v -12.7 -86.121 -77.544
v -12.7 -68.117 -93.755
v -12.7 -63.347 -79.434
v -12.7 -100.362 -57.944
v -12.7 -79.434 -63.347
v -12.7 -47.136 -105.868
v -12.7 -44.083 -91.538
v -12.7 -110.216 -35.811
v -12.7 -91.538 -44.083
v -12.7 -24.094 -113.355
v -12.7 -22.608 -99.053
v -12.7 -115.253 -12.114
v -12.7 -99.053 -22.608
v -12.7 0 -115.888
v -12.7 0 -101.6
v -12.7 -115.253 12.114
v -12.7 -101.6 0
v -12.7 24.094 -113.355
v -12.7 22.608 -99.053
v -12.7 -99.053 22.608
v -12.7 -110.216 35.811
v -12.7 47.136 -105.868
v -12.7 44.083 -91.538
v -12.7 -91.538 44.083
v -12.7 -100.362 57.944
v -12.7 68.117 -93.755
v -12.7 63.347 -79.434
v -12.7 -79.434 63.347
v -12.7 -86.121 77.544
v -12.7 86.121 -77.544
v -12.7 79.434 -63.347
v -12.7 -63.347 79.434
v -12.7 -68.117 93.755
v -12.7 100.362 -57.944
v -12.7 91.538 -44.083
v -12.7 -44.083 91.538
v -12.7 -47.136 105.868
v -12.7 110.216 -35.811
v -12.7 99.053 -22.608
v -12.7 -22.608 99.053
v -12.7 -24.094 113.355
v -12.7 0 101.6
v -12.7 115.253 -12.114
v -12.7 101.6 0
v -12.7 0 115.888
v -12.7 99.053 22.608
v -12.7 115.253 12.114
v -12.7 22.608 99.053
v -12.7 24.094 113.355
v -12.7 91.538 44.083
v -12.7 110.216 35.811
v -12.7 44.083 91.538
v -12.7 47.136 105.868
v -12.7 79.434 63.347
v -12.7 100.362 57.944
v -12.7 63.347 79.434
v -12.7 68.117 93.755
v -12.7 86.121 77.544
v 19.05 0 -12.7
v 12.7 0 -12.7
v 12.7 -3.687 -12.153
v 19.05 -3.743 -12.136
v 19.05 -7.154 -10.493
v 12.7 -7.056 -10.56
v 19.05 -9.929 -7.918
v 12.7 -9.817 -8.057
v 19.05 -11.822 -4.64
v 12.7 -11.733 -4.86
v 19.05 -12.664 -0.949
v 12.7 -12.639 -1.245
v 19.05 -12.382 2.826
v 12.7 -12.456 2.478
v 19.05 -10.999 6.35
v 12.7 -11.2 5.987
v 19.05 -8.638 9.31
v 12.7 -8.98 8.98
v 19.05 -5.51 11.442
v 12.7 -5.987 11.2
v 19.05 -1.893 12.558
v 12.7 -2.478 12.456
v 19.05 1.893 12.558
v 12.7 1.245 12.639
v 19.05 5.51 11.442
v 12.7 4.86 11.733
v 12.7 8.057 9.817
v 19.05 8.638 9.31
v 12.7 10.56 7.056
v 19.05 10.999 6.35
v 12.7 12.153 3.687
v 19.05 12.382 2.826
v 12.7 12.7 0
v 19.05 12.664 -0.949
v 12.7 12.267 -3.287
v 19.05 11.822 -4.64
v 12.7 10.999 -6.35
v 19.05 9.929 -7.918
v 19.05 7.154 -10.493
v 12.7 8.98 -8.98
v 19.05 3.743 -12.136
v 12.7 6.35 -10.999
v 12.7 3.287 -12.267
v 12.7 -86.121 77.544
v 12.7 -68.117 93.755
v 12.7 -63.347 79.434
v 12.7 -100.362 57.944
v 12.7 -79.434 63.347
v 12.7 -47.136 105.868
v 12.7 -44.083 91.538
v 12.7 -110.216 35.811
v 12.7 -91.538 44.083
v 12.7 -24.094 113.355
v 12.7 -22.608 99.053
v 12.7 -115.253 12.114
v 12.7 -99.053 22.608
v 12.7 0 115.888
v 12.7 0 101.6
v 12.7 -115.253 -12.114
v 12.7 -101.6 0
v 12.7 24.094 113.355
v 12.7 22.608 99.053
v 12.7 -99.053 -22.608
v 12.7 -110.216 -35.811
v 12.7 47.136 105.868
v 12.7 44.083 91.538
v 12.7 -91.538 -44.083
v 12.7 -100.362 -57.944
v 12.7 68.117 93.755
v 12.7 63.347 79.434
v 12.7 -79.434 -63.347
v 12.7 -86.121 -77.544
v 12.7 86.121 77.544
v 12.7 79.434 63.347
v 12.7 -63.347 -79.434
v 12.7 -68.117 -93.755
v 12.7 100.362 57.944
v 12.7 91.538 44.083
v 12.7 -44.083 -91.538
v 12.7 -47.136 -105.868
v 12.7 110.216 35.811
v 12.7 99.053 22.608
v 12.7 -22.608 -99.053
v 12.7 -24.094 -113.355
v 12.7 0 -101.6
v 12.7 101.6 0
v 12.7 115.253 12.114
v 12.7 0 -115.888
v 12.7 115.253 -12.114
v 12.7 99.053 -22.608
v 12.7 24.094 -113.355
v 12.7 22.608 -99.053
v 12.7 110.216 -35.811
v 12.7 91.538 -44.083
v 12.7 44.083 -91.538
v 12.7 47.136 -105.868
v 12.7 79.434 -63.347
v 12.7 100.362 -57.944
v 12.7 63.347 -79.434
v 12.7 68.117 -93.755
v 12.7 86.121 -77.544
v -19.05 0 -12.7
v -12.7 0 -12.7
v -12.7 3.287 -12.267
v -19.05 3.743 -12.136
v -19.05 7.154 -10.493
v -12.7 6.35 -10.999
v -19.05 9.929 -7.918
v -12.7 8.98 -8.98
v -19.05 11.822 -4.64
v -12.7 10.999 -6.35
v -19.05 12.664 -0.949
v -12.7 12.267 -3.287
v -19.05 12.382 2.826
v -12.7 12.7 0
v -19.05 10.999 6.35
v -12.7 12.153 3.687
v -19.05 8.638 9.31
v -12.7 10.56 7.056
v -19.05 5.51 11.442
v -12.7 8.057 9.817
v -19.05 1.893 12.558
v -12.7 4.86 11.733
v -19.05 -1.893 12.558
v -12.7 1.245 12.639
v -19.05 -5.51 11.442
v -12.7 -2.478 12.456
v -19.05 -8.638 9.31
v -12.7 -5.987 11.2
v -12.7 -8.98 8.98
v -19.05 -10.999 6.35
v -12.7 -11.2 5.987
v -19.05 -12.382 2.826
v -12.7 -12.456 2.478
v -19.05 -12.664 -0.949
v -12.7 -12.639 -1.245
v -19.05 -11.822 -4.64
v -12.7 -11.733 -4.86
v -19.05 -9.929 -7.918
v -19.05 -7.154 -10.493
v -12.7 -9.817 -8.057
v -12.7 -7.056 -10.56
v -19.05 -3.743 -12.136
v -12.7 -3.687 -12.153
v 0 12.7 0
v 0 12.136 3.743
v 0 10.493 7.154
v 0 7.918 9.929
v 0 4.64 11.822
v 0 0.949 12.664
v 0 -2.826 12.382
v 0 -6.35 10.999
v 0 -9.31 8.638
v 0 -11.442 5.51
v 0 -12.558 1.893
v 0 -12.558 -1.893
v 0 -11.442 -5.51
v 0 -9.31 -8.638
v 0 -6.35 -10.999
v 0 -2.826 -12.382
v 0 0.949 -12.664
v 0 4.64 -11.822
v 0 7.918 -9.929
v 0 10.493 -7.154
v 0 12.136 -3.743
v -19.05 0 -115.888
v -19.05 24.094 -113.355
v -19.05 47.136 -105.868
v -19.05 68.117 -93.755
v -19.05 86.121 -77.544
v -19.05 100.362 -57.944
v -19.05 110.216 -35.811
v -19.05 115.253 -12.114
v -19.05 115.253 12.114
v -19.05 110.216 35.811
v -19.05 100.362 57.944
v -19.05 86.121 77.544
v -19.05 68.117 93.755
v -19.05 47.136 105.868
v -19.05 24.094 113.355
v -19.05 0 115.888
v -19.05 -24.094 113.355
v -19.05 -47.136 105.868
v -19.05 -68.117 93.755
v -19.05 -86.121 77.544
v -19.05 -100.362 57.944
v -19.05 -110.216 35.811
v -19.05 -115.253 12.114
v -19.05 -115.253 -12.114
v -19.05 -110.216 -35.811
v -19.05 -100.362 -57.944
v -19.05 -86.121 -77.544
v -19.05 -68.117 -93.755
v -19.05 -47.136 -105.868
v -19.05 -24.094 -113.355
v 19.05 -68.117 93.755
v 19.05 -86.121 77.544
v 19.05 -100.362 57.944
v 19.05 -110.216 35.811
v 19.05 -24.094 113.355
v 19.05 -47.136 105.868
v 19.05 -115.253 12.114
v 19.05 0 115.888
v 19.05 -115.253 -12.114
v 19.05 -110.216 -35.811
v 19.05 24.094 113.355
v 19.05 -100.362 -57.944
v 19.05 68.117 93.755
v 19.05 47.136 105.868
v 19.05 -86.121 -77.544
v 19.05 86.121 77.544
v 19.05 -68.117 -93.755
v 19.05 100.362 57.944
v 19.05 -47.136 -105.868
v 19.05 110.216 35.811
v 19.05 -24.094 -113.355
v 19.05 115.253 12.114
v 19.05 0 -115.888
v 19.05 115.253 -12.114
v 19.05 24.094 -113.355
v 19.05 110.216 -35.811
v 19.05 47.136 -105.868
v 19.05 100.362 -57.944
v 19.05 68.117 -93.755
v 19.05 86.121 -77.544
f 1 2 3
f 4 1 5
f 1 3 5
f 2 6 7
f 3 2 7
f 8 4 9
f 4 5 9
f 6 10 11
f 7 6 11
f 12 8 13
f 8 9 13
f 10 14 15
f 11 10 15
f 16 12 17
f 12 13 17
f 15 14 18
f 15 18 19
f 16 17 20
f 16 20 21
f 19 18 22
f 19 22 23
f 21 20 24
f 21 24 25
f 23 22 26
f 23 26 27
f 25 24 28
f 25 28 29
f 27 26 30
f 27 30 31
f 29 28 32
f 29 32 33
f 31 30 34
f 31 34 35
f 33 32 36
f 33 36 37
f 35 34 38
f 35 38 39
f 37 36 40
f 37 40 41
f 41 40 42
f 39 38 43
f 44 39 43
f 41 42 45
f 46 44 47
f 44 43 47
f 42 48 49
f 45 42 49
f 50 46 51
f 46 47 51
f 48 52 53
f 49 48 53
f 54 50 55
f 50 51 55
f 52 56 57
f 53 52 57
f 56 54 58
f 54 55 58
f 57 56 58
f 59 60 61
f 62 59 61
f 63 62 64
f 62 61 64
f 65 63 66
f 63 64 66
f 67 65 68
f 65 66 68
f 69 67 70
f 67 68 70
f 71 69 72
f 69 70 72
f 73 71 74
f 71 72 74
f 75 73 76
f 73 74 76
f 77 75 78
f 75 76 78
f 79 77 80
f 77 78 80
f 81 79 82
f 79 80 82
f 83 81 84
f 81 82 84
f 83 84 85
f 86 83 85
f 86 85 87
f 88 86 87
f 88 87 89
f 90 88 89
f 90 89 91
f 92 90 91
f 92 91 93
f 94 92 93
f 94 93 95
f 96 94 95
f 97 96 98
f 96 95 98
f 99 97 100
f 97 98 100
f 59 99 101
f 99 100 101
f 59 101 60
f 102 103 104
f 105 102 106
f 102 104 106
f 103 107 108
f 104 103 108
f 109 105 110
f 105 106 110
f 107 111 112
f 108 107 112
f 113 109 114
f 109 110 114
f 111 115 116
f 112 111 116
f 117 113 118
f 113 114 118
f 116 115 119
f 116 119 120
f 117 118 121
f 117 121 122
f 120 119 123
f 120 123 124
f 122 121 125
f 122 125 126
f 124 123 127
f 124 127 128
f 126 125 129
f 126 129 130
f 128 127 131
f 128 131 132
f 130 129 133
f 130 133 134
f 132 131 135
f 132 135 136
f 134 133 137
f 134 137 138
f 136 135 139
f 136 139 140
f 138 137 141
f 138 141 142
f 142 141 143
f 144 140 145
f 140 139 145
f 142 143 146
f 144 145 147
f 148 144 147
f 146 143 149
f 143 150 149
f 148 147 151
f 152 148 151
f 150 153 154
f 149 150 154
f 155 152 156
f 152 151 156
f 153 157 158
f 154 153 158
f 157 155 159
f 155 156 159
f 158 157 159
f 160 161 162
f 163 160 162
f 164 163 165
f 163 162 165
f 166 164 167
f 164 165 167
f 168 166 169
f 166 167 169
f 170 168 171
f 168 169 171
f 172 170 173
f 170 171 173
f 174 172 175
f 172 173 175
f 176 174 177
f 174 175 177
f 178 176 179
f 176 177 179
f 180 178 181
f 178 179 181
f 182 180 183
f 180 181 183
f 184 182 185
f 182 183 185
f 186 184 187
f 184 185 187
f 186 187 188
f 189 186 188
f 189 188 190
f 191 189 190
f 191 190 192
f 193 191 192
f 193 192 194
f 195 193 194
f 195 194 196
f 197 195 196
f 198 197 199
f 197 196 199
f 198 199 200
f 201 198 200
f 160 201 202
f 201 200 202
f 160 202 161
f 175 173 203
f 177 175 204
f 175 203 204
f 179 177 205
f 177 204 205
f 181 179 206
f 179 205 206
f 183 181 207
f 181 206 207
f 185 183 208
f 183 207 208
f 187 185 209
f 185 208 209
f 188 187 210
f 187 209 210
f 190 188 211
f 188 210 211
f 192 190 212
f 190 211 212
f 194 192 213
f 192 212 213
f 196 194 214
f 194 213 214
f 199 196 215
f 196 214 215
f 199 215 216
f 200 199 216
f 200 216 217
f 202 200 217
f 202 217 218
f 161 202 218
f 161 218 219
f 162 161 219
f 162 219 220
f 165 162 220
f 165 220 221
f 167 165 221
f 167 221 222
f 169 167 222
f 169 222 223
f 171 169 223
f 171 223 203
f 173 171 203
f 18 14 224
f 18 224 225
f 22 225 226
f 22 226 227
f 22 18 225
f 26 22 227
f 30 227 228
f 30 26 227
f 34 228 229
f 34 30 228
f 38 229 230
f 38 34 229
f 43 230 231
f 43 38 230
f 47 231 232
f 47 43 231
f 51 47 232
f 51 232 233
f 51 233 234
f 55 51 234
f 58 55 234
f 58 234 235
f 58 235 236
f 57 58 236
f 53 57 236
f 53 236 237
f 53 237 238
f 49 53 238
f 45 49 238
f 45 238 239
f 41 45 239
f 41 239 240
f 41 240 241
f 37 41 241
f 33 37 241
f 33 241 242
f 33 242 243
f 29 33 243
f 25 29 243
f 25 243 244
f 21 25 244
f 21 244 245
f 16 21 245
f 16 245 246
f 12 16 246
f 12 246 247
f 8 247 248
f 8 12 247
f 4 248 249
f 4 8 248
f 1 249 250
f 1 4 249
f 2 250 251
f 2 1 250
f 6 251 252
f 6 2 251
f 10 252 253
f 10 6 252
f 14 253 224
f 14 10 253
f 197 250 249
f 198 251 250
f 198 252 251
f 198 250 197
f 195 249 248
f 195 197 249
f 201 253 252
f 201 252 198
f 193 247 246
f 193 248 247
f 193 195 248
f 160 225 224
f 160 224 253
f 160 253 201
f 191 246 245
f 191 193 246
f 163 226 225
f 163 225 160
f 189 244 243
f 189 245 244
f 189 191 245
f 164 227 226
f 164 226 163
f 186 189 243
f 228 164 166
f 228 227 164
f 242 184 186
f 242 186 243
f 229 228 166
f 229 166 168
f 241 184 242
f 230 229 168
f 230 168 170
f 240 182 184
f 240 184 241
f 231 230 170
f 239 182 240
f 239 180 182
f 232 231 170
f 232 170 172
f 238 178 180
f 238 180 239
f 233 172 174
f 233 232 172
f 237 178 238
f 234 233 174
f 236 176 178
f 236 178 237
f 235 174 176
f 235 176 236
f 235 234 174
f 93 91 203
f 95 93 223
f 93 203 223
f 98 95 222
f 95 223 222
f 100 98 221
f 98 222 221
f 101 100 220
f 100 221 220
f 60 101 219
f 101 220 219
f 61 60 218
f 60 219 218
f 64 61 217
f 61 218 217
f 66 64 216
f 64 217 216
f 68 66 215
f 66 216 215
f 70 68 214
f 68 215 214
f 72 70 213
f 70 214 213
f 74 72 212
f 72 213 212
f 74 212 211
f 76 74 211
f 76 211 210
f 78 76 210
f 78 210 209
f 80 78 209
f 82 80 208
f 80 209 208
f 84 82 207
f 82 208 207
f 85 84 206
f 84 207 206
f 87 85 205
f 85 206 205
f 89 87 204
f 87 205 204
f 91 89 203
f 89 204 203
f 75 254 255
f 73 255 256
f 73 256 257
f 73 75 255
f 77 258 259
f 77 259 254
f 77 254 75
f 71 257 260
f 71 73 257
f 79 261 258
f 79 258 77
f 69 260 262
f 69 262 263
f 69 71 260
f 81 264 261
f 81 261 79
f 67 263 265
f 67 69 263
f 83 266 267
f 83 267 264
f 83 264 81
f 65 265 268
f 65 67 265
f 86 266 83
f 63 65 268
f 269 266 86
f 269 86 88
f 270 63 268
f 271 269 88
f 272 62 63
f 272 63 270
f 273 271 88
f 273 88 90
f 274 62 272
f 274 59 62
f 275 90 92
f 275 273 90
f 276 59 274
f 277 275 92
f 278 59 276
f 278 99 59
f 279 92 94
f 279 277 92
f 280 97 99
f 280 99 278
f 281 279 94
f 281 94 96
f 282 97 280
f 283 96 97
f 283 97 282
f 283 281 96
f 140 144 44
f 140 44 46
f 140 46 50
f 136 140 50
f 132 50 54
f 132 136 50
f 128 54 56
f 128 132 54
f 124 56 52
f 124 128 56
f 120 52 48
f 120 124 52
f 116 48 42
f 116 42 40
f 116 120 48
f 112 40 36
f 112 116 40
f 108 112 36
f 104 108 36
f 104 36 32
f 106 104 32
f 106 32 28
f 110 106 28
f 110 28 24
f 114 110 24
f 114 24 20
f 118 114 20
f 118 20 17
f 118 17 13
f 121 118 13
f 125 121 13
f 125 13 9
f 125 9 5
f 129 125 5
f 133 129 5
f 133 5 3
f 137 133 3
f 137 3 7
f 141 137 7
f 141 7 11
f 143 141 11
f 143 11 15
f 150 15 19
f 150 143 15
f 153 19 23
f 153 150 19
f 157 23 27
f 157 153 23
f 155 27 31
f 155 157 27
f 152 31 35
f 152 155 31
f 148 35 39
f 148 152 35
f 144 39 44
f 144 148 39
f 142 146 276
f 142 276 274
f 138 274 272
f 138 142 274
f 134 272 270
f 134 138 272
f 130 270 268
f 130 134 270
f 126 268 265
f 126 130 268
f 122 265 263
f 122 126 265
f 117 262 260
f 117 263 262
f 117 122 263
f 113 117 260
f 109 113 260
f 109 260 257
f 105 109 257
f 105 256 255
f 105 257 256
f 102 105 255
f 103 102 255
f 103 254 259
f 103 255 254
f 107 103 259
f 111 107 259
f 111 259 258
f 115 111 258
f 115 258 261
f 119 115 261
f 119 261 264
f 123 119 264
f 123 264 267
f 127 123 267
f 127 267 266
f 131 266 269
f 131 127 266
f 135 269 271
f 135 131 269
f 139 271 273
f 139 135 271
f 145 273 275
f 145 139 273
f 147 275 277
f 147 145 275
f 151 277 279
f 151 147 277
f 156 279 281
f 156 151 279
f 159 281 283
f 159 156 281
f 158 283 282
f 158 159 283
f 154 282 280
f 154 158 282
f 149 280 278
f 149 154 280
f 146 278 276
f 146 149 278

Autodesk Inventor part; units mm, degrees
ref_plane "XZ Plane" through (0, 0, 0) normal (0, 1, 0) x (-1, 0, 0)
ref_plane "XY Plane" through (0, 0, 0) normal (0, 0, 1) x (1, 0, 0)
sketch "Sketch1" plane through (0, 0, 0) normal (1, 0, 0) x (0, 1, 0)
  circle A0 centre (0, 0) radius 101.6
  circle A1 centre (0, 0) radius 12.7
  dimension "d0" = 203.2
  dimension "d1" = 25.4
extrude "Extrusion1" add sketch "Sketch1" along normal mid plane 25.4
sketch "Sketch3" plane through (12.7, 0, 0) normal (1, 0, 0) x (0, 0, -1)
  circle A0 centre (0, 0) radius 12.7
  circle A1 centre (0, 0) radius 115.8875
  dimension "d7" = 25.4
  dimension "d8" = 231.775
extrude "Extrusion3" add sketch "Sketch3" along normal blind 6.35
mirror "Mirror1" about plane through (0, 0, 0) normal (1, 0, 0) of "Extrusion3"
properties part number "Wheel" material "Wood (Birch)"
